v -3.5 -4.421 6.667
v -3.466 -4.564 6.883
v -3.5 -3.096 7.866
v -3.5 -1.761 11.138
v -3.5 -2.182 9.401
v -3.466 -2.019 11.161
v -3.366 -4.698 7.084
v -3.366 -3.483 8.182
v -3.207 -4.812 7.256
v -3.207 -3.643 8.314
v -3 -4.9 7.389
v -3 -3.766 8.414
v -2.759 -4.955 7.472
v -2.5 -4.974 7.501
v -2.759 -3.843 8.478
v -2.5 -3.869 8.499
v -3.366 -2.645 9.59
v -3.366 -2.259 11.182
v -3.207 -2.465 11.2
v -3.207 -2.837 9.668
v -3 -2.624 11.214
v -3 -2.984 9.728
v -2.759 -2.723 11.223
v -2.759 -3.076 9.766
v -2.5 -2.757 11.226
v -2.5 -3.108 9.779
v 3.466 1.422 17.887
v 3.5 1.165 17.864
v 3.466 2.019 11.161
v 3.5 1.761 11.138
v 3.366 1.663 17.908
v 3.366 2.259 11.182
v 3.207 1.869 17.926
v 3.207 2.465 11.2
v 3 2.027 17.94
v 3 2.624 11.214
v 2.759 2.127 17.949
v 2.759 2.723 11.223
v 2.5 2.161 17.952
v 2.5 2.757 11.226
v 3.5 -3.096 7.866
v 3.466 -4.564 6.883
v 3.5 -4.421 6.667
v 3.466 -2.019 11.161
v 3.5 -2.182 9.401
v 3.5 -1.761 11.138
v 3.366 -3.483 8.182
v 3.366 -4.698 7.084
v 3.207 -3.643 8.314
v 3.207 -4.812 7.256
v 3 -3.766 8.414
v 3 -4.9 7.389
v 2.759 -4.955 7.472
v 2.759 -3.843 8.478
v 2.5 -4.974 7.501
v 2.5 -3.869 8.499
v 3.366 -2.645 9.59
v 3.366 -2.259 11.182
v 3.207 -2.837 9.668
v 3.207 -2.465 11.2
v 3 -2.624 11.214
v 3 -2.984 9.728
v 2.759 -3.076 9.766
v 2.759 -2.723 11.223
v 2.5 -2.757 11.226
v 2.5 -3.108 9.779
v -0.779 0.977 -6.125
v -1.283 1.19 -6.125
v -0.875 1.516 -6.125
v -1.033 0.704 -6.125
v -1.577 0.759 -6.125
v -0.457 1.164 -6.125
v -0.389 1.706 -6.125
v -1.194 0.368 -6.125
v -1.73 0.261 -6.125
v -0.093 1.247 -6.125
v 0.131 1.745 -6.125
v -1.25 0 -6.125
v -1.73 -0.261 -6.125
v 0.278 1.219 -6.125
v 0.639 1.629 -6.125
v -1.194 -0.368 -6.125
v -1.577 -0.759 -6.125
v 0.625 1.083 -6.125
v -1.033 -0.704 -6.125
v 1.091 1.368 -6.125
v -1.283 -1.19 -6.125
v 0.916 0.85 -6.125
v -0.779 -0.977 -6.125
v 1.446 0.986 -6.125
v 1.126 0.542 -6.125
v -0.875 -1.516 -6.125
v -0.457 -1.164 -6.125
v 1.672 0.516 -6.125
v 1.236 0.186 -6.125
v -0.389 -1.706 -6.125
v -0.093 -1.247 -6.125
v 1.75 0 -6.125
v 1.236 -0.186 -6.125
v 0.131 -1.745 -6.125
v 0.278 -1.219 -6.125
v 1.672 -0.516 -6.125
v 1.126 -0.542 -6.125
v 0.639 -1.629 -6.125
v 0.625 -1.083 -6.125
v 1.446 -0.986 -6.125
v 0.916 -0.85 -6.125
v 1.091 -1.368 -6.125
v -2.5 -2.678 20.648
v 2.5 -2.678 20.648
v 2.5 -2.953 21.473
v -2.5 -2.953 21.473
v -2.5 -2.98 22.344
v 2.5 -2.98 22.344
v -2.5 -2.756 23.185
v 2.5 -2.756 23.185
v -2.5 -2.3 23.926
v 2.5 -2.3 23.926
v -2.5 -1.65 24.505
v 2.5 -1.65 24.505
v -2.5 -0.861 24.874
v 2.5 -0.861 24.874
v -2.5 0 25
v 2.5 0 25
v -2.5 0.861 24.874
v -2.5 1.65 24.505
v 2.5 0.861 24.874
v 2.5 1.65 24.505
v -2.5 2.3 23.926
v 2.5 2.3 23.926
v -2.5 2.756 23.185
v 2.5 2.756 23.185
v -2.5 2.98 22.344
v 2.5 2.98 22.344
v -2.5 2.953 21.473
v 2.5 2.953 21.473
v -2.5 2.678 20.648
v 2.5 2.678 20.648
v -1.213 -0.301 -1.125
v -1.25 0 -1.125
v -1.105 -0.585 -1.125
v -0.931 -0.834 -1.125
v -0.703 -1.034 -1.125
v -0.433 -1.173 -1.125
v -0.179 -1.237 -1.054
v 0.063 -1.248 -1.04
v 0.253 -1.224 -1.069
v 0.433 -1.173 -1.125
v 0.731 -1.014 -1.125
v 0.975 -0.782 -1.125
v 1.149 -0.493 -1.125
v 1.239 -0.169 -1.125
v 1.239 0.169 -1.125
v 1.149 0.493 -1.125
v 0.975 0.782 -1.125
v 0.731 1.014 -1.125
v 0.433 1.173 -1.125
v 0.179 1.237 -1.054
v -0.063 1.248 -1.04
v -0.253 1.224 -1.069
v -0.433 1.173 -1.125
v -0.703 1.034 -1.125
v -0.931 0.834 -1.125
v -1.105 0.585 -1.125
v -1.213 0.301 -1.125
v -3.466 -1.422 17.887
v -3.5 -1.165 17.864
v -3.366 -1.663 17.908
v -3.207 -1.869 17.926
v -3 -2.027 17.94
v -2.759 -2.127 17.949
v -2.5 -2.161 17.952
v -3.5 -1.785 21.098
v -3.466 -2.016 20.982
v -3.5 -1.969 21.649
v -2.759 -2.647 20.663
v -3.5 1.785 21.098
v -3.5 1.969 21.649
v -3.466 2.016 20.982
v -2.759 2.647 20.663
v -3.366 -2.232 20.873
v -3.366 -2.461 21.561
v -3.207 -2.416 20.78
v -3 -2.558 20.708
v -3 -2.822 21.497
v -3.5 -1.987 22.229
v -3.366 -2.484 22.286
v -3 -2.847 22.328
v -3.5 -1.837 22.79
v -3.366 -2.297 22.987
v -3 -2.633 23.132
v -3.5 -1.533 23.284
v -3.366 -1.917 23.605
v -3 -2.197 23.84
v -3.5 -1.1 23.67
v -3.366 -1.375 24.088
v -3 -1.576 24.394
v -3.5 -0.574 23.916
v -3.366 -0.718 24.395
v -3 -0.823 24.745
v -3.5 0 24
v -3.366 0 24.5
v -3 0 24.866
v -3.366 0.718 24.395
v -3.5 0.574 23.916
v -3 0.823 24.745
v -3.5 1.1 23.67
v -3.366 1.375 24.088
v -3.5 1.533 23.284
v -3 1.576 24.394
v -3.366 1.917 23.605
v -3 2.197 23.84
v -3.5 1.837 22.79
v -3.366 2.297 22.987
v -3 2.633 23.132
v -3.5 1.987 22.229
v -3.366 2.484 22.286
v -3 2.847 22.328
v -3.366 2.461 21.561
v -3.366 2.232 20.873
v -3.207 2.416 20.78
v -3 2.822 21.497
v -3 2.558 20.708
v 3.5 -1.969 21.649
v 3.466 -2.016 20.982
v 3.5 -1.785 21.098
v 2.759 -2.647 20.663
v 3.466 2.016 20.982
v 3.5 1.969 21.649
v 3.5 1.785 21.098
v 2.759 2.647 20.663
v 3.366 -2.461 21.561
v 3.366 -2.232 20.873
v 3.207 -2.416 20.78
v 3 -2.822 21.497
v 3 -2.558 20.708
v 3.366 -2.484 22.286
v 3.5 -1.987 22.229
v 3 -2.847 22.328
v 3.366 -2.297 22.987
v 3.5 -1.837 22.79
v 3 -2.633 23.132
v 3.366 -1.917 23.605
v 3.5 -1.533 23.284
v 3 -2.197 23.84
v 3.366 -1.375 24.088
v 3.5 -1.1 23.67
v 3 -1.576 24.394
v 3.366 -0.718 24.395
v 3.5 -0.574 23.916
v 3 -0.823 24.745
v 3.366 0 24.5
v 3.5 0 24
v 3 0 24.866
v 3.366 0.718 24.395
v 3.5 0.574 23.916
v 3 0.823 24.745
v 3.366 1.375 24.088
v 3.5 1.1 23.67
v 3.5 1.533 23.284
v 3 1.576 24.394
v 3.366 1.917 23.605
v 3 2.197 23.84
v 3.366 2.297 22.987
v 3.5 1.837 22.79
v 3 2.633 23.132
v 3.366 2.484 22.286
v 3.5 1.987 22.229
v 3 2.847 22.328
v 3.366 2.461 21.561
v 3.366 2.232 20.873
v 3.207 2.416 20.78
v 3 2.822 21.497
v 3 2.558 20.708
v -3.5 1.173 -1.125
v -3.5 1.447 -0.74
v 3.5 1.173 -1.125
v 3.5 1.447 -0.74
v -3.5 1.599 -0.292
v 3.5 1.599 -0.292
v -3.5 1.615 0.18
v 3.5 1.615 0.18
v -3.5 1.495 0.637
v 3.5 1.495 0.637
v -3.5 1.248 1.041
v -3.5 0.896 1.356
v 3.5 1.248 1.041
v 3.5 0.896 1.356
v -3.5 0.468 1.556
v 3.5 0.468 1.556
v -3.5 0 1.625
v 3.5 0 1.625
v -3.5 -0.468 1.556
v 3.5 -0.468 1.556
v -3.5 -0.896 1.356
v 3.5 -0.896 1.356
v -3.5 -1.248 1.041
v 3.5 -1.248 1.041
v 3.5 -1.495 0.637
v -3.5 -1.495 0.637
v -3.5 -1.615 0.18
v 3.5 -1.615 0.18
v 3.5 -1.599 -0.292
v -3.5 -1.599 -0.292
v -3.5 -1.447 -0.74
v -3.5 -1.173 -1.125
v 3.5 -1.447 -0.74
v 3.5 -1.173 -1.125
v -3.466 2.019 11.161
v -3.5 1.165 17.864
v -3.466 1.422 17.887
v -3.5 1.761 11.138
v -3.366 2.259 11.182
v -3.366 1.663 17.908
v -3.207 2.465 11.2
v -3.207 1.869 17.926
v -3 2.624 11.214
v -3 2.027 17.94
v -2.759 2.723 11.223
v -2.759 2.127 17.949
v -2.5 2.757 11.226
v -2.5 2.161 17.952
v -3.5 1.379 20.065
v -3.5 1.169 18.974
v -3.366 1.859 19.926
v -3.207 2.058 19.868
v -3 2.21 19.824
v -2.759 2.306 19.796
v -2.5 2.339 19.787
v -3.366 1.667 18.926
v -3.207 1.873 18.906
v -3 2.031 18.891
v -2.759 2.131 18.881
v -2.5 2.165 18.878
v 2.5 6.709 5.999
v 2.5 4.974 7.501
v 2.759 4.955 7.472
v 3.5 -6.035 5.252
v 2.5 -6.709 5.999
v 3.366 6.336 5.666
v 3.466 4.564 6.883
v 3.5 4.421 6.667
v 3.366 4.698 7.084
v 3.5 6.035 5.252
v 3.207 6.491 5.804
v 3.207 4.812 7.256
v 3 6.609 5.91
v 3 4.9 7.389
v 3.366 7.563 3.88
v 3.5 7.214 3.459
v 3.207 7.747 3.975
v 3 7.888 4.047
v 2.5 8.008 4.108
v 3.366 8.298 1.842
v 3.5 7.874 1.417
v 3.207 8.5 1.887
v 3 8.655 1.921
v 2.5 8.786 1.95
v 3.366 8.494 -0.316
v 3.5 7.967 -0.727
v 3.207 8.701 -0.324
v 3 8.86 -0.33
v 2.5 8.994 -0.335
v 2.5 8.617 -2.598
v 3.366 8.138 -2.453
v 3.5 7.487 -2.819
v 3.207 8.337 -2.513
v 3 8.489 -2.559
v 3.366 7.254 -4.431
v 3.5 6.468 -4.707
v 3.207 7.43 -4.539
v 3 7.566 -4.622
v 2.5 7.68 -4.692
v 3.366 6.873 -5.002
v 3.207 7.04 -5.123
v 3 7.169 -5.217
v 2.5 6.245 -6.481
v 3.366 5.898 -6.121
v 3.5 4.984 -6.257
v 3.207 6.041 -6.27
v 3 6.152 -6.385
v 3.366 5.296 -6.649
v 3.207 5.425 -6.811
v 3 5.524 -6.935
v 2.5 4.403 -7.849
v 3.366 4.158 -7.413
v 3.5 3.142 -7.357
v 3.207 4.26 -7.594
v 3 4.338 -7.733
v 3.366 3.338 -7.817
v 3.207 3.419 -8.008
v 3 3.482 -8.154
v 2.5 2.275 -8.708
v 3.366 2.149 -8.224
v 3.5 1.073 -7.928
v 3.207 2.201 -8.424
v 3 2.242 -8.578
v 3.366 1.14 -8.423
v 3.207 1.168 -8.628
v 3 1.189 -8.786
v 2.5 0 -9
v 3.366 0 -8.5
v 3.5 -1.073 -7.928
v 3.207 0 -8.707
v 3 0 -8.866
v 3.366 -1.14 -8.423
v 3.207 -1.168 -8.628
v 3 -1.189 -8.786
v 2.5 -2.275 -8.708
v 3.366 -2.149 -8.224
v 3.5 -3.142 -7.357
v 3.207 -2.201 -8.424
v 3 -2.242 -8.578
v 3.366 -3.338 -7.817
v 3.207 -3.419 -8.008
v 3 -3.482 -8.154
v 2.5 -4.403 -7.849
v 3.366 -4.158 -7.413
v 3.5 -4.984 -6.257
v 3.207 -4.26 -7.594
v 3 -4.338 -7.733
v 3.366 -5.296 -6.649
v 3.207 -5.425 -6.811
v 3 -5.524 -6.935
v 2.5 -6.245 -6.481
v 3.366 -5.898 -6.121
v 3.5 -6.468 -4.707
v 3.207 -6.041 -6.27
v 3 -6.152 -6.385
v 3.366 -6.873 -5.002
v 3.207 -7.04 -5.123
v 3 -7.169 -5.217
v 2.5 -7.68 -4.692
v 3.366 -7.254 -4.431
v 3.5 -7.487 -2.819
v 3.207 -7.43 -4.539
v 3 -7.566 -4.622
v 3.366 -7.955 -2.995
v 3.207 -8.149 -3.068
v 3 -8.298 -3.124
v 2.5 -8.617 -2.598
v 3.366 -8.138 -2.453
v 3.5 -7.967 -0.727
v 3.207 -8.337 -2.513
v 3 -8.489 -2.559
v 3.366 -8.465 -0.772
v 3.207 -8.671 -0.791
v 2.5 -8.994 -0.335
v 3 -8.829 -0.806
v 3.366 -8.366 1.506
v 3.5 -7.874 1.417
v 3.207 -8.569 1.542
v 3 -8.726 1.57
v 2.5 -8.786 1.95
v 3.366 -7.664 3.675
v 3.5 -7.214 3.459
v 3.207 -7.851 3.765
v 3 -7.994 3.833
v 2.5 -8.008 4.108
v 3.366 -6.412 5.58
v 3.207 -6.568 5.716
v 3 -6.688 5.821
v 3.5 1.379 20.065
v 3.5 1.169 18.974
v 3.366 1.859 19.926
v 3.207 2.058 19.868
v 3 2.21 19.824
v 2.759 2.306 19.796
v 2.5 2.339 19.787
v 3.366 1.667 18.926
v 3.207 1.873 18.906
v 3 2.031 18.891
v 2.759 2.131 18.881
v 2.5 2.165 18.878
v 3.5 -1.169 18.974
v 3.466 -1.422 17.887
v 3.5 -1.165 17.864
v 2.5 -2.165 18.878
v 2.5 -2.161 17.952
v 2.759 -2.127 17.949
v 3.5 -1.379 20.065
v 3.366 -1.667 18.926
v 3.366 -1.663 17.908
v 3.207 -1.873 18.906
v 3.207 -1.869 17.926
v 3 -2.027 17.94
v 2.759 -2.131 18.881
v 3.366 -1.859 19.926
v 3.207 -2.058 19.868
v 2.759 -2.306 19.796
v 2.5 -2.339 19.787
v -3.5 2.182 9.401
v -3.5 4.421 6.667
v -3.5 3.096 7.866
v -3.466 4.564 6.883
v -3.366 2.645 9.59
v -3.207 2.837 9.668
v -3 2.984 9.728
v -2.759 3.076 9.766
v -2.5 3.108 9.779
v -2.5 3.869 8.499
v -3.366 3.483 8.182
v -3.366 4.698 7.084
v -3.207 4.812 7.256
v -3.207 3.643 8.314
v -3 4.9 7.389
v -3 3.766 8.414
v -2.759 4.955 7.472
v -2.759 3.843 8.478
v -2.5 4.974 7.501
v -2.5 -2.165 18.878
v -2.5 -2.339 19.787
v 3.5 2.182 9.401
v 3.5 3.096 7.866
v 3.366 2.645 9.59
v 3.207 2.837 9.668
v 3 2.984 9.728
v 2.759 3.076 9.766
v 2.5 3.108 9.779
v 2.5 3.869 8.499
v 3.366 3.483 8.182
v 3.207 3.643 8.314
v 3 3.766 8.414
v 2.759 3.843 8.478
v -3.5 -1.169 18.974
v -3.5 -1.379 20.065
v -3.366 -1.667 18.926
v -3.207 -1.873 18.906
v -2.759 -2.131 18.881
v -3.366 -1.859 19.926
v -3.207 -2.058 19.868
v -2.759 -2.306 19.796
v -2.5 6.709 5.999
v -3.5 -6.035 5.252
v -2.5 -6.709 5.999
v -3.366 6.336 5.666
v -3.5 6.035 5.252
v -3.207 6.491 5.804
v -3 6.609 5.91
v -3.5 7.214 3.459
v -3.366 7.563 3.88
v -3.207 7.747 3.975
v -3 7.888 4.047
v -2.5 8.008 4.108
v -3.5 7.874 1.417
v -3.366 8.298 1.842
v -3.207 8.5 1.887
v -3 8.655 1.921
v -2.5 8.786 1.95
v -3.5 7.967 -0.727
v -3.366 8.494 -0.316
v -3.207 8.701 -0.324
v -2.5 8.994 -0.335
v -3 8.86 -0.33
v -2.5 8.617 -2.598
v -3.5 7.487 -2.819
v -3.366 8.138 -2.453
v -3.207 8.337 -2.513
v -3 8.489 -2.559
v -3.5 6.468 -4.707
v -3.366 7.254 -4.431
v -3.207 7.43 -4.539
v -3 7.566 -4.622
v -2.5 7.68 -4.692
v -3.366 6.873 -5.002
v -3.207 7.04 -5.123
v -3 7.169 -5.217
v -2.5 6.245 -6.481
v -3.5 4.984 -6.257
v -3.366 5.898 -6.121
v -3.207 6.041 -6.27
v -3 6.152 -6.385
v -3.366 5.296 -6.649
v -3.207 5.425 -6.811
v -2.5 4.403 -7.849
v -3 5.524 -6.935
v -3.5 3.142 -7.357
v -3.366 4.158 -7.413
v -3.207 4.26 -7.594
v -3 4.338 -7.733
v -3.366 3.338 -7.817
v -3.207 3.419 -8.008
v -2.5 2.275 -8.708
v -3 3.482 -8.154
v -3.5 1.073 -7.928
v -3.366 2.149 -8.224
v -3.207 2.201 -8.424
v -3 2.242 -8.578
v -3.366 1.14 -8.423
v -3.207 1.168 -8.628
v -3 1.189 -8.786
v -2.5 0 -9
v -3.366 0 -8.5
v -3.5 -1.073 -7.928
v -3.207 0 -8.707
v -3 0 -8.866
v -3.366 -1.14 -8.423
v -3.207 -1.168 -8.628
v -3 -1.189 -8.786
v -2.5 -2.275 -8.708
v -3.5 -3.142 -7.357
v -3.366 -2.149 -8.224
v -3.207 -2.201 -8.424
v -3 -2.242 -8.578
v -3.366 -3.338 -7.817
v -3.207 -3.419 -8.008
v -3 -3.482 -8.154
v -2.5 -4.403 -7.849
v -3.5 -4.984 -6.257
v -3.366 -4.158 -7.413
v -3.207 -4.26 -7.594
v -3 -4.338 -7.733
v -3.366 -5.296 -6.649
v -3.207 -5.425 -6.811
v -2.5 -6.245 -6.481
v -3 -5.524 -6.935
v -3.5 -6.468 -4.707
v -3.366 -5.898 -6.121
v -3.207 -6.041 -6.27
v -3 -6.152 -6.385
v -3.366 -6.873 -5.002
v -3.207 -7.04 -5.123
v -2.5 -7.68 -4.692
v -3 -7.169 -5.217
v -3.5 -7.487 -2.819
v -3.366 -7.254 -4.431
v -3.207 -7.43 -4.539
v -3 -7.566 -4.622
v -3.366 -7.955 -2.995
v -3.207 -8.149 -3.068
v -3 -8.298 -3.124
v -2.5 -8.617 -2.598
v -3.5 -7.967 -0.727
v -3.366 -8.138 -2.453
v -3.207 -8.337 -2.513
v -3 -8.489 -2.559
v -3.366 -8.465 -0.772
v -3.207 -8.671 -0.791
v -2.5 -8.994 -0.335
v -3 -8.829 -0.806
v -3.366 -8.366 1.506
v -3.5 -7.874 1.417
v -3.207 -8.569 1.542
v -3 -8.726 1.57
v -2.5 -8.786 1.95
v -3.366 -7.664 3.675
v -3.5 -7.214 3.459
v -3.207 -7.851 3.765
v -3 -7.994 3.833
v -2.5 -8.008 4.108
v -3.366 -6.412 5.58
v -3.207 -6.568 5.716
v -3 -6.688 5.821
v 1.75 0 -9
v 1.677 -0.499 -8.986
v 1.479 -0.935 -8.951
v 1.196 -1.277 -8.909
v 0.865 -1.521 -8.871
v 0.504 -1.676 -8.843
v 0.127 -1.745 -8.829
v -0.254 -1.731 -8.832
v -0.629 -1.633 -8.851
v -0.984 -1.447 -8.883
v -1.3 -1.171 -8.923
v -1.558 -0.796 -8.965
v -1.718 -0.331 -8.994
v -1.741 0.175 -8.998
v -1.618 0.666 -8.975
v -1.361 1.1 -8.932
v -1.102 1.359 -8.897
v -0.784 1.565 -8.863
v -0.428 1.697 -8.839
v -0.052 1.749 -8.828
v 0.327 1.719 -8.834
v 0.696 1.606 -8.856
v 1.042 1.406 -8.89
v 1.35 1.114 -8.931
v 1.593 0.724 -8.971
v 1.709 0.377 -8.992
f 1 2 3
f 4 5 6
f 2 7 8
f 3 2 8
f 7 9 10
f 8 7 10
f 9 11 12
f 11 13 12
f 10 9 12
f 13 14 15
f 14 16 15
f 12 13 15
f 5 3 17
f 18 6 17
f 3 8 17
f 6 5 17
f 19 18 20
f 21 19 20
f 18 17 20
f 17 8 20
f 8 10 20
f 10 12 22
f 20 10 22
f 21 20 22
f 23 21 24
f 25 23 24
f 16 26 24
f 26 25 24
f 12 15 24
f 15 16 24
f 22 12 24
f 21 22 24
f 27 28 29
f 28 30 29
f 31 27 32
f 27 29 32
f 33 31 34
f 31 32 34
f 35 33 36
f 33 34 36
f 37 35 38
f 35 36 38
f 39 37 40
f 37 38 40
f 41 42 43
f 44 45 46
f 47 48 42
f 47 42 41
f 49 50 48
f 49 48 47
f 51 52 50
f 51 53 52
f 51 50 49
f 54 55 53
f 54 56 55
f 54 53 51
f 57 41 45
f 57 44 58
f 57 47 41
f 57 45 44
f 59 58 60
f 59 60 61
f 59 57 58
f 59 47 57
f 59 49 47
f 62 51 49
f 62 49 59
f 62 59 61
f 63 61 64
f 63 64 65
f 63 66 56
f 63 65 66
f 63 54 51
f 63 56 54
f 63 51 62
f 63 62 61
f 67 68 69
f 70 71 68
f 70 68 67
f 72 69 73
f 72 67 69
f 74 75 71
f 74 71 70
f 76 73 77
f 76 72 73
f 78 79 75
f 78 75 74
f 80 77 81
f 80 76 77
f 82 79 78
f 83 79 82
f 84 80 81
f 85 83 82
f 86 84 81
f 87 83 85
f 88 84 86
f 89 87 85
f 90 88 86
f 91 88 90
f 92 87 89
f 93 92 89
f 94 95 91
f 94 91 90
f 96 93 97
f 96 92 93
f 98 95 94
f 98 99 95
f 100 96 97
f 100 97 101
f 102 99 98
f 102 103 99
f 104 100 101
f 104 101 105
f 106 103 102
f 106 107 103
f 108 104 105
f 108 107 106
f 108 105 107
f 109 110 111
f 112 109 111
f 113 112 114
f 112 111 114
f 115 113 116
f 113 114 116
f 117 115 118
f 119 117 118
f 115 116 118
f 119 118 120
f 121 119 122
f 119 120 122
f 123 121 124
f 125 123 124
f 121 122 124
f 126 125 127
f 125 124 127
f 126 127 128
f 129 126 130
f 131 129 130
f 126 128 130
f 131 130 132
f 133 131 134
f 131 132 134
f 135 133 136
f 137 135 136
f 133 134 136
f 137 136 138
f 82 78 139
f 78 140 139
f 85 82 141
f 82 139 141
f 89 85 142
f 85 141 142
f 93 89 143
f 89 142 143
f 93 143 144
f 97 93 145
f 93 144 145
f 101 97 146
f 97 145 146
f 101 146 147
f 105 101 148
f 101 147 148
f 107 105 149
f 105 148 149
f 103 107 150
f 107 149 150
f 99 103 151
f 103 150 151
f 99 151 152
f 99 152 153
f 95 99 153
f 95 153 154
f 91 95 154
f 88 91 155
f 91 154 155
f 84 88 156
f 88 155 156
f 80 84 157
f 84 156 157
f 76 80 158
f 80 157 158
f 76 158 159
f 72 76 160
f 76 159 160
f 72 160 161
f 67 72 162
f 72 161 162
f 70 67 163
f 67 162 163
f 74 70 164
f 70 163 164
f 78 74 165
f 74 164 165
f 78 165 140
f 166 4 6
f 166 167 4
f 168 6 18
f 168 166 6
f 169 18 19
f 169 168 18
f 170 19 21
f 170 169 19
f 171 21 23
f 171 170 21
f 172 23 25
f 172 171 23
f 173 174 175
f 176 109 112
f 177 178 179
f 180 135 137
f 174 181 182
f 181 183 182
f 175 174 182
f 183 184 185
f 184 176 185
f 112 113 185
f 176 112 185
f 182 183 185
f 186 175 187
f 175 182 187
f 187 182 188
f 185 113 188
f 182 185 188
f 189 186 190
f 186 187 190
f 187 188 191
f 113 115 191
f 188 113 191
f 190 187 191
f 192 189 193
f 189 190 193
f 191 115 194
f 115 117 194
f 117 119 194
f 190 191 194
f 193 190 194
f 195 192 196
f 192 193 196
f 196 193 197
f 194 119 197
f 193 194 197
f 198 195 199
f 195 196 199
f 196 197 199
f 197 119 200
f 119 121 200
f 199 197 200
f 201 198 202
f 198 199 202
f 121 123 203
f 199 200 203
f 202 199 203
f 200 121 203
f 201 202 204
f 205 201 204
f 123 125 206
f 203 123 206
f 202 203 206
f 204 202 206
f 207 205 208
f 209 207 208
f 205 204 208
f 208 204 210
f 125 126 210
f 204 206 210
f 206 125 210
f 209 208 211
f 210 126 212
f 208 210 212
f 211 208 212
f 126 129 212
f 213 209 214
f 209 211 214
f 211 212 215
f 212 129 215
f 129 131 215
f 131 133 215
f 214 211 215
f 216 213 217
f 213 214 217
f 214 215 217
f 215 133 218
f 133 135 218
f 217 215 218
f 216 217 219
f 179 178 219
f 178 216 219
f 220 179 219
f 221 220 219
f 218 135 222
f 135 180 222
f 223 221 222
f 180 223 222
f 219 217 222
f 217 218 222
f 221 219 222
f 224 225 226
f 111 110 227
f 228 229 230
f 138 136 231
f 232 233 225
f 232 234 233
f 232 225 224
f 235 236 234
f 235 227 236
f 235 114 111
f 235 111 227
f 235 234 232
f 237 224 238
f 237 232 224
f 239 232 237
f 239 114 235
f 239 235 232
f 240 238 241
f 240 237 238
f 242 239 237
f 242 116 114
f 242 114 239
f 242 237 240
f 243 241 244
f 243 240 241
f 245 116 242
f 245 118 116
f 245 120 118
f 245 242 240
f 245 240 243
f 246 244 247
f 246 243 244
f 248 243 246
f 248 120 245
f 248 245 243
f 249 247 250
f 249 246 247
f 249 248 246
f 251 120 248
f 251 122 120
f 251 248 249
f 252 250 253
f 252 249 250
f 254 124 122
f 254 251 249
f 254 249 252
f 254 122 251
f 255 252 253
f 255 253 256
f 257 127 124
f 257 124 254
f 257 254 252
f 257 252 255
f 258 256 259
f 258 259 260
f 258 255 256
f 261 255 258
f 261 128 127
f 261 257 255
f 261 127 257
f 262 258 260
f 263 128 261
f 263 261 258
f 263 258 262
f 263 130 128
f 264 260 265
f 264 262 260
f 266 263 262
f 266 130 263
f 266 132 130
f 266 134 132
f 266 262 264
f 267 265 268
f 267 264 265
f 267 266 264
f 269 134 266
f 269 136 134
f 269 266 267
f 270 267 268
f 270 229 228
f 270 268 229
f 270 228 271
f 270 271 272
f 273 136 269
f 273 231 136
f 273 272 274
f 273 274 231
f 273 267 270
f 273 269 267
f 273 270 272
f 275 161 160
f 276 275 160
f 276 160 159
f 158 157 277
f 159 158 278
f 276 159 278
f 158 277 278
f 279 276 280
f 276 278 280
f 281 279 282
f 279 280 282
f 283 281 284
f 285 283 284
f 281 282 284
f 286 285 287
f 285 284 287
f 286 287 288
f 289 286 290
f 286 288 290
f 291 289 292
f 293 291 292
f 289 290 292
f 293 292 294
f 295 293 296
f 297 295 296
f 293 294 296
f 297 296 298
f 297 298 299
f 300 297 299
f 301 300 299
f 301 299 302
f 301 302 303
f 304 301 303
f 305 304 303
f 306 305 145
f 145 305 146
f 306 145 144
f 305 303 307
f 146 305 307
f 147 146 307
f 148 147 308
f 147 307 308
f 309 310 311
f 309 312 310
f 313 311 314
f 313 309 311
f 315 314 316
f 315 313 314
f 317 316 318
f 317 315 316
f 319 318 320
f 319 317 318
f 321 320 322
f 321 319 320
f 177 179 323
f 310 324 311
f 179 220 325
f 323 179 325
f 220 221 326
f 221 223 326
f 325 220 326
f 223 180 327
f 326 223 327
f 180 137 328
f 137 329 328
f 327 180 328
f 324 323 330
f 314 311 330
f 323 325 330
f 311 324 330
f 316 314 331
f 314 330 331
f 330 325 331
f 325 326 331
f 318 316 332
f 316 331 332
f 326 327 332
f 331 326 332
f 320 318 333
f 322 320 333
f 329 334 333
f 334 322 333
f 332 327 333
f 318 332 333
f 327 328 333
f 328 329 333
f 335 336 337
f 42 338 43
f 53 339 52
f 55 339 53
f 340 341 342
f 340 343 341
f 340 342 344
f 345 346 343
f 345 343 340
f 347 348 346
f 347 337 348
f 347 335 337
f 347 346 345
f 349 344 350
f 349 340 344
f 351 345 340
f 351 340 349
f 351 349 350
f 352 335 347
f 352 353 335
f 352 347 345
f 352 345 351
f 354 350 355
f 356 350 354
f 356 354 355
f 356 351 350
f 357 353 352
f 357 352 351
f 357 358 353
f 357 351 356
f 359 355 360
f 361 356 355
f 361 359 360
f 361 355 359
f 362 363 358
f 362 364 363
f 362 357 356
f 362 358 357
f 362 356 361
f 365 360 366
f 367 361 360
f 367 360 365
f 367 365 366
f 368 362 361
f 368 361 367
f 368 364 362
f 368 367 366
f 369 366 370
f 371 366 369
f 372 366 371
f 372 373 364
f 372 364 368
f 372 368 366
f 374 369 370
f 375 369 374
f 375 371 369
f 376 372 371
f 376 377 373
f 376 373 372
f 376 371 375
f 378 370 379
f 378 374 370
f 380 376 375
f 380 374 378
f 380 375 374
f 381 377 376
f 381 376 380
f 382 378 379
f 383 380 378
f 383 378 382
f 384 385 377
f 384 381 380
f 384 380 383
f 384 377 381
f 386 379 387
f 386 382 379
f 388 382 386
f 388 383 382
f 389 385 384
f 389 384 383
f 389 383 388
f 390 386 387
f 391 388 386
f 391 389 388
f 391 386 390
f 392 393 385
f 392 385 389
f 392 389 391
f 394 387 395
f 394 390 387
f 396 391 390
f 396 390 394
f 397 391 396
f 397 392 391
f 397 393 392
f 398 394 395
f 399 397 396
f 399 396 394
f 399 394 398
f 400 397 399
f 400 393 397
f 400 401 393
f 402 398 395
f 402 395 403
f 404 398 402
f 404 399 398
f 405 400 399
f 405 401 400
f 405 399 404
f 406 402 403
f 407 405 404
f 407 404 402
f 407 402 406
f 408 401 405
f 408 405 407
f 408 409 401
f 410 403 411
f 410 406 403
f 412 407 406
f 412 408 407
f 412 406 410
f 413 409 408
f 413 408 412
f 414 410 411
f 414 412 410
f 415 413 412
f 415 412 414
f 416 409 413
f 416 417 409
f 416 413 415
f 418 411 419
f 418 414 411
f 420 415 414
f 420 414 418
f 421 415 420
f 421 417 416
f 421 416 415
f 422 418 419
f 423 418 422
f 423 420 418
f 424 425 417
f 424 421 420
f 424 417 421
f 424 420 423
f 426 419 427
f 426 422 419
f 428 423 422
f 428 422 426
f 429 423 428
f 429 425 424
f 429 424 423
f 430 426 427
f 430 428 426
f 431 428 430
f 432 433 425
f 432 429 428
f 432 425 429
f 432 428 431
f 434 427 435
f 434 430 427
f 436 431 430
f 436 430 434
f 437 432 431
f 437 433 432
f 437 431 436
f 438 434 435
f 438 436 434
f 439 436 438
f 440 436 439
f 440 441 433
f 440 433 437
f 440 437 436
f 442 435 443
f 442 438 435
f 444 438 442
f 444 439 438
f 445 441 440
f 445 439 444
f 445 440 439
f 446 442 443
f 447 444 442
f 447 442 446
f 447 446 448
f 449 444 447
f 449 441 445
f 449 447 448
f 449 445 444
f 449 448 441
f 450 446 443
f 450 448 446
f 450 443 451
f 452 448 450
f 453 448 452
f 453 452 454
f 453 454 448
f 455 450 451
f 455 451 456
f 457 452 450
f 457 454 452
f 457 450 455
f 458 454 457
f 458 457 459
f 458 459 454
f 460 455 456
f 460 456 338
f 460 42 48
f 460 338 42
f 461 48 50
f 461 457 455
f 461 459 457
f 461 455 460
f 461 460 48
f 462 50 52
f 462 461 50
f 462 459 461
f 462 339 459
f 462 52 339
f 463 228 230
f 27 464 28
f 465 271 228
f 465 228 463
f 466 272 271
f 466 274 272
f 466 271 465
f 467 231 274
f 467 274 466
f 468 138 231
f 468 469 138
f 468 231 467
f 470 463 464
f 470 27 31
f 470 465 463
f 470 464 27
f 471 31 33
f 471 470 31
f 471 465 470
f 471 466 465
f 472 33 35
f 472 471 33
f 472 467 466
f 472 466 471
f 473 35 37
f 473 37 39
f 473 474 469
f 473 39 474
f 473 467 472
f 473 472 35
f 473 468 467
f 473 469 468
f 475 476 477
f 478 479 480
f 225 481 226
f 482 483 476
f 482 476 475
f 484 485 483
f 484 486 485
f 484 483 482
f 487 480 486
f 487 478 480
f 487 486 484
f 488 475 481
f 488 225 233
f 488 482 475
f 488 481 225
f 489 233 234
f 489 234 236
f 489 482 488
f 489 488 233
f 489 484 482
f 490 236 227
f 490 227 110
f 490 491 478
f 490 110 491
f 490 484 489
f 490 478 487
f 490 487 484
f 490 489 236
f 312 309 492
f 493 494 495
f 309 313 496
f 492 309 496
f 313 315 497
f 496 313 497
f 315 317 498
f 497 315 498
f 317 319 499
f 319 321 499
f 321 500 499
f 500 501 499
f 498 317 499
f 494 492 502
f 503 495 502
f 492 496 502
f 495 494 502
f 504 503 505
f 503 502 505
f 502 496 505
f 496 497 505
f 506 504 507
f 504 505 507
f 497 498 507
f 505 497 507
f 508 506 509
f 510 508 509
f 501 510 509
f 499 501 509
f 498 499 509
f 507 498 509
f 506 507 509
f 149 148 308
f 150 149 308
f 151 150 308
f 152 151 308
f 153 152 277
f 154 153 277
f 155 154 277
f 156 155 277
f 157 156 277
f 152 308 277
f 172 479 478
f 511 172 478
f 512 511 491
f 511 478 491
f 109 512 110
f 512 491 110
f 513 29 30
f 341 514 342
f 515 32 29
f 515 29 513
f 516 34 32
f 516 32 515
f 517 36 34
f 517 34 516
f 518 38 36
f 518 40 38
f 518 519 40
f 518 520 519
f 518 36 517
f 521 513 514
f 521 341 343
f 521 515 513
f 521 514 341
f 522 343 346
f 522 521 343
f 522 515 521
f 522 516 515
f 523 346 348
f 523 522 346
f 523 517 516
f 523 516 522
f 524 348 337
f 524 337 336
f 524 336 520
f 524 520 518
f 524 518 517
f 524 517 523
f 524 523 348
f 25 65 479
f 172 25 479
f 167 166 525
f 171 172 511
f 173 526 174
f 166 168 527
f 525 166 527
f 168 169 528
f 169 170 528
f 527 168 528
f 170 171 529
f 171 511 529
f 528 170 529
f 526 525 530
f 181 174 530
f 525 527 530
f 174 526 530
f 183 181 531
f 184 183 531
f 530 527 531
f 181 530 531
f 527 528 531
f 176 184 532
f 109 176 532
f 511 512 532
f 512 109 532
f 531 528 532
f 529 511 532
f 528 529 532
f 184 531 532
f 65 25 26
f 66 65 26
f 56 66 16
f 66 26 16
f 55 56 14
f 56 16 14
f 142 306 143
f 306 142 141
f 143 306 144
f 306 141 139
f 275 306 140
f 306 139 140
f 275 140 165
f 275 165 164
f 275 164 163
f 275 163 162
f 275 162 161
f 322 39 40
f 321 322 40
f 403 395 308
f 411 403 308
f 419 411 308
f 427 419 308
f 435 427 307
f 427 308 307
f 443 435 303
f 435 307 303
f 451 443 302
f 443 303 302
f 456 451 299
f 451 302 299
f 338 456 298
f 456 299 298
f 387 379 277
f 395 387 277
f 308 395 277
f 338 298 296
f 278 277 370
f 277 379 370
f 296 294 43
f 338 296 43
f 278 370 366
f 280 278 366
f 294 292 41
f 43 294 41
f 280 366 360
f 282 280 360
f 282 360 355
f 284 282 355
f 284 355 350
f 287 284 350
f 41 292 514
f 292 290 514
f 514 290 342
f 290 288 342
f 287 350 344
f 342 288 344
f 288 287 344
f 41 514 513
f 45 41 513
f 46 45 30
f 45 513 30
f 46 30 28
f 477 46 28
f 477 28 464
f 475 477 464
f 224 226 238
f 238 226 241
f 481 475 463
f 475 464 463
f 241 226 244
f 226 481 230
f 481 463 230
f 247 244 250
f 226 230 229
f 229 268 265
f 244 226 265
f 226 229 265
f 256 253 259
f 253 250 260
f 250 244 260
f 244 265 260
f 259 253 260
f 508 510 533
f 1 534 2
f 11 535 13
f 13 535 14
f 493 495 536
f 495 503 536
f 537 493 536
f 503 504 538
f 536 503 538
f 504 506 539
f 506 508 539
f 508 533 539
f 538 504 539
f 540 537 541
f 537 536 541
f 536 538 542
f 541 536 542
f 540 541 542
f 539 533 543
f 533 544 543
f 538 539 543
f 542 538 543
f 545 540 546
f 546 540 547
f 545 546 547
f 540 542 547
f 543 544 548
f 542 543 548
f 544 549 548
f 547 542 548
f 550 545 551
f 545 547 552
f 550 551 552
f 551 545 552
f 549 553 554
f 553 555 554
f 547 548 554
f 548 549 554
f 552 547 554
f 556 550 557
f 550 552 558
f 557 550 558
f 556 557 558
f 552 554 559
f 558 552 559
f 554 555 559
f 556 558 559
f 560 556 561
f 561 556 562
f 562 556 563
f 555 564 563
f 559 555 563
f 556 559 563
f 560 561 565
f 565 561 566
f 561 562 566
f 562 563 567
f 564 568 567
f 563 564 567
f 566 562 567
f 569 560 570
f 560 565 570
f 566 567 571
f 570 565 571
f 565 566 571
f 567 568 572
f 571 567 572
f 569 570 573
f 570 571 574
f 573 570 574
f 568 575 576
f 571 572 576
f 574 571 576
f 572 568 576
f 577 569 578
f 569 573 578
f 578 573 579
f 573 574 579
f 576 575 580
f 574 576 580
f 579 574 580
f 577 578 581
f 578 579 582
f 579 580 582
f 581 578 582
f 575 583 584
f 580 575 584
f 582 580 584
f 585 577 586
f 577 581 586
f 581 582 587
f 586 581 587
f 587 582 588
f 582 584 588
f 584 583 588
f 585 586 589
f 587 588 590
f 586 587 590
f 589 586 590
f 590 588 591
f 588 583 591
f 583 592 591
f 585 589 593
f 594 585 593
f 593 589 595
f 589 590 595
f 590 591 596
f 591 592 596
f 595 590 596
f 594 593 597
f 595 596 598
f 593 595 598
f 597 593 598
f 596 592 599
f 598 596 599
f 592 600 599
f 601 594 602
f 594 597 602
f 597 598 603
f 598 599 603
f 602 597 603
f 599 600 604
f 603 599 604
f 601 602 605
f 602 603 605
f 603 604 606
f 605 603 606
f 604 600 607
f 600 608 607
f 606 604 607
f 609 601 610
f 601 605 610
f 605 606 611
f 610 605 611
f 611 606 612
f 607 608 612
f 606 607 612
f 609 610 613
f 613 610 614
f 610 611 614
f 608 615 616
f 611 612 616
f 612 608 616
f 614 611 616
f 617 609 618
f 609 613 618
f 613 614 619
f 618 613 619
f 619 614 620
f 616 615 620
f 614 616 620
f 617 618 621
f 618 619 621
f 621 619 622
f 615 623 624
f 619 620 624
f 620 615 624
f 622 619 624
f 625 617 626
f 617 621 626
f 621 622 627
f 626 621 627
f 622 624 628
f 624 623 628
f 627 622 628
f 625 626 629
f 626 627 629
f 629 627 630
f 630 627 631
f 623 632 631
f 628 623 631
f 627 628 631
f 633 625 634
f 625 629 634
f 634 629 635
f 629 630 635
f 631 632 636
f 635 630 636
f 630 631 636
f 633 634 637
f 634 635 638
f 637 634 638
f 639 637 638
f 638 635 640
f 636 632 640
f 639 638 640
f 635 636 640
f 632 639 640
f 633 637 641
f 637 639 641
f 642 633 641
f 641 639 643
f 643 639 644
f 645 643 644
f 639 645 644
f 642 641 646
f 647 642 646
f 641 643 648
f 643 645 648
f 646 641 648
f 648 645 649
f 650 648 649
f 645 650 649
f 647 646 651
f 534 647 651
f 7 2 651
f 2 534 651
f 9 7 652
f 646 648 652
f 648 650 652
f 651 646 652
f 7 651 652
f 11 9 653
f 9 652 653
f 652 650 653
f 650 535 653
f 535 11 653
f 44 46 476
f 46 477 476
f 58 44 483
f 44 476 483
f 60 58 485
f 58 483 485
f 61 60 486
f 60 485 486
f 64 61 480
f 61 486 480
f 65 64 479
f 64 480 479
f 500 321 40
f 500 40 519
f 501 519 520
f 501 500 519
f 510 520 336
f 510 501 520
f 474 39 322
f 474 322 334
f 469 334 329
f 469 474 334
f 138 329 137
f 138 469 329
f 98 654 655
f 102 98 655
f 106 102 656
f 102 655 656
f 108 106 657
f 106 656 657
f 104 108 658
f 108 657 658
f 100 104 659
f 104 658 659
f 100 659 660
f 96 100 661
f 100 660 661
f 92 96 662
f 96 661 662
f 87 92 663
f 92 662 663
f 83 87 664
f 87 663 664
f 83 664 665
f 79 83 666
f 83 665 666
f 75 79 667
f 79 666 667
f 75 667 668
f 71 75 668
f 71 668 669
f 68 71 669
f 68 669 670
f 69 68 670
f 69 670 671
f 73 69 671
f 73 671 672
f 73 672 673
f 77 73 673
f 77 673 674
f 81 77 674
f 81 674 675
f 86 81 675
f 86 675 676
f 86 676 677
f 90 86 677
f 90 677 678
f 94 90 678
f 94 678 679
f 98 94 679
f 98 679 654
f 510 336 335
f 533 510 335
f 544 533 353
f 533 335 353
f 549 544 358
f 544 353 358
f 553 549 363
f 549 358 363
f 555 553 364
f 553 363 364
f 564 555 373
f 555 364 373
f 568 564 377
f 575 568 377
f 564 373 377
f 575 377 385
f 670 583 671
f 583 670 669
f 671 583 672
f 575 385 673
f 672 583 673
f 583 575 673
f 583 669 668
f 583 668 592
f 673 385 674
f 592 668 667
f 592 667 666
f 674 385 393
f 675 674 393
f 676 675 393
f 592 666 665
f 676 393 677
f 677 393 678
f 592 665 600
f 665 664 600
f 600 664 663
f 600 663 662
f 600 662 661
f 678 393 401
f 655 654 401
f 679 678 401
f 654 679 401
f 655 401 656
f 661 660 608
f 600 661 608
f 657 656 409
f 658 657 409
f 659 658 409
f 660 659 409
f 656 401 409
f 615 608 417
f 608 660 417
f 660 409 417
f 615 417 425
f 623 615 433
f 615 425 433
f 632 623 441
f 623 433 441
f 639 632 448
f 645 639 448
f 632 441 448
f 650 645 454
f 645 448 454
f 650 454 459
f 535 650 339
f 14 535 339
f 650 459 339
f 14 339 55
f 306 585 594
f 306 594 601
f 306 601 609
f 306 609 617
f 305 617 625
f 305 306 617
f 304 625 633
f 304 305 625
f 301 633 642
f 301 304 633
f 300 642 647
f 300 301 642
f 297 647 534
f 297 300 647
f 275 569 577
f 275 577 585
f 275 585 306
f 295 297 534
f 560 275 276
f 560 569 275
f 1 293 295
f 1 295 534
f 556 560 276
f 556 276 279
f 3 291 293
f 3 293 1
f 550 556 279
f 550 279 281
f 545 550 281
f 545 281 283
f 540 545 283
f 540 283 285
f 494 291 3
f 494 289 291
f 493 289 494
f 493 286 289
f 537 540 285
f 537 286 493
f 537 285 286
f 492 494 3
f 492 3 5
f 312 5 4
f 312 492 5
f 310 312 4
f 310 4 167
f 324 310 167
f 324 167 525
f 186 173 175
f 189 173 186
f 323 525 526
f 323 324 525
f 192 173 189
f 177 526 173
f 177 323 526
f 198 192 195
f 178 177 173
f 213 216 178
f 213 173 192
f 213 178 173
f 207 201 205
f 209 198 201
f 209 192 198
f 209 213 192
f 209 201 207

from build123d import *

# Parameters (mm, degrees)
BOSS_EXTRUDE1_DEPTH = 3.5
FILLET1_R           = 5
HOLE1_D             = 2.5
HOLE1_DEPTH         = 9
HOLE1_CBORE_D       = 3.5
HOLE1_CBORE_DEPTH   = 3
FILLET2_R           = 1


with BuildPart() as part:
    # Sketch1 → Boss-Extrude1 (new, symmetric)
    with BuildSketch(Plane(origin=(0, 0, 0), x_dir=(0, 0, -1), z_dir=(1, 0, 0))):
        with BuildLine():
            Line((-19.763932023, 2), (-8.485281374, 3))
            ThreePointArc((-8.485281374, 3), (9, 0), (-8.485281374, -3))
            Line((-8.485281374, -3), (-19.763932023, -2))
            ThreePointArc((-19.763932023, -2), (-25, 0), (-19.763932023, 2))
        make_face()
        with BuildLine():
            Line((1.125, -1.17260394), (1.125, 1.17260394))
            ThreePointArc((1.125, 1.17260394), (-1.625, 0), (1.125, -1.17260394))
        make_face(mode=Mode.SUBTRACT)
    extrude(amount=BOSS_EXTRUDE1_DEPTH, both=True)

    # Fillet1
    fillet1_edges = [part.edges().sort_by_distance(p)[0] for p in [
        (0, 2, 19.763932023),
        (0, 3, 8.485281374),
        (0, -3, 8.485281374),
        (0, -2, 19.763932023),
    ]]
    fillet(fillet1_edges, radius=FILLET1_R)

    # Hole1
    with Locations(Plane(origin=(0, 0, -9.125), x_dir=(1, 0, 0), z_dir=(0, 0, -1))):
        with Locations((0, 0)):
            CounterBoreHole(HOLE1_D / 2, HOLE1_CBORE_D / 2, HOLE1_CBORE_DEPTH, depth=HOLE1_DEPTH)

    # Fillet2
    fillet2_edges = [part.edges().sort_by_distance(p)[0] for p in [
        (-3.5, 0, 25),
        (3.5, 0, 25),
        (-3.5, 2.458817952, 14.589084631),
        (3.5, 2.458817952, 14.589084631),
        (-3.5, 0, -9),
        (3.5, 0, -9),
        (-3.5, -2.458817952, 14.589084631),
        (3.5, -2.458817952, 14.589084631),
        (-3.5, 2.230698388, 19.336127101),
        (3.5, 2.230698388, 19.336127101),
        (-3.5, -3.440789323, 9.110481838),
        (3.5, -3.440789323, 9.110481838),
        (-3.5, -2.230698388, 19.336127101),
        (3.5, -2.230698388, 19.336127101),
        (-3.5, 3.440789323, 9.110481838),
        (3.5, 3.440789323, 9.110481838),
    ]]
    fillet(fillet2_edges, radius=FILLET2_R)


solid = part.part
